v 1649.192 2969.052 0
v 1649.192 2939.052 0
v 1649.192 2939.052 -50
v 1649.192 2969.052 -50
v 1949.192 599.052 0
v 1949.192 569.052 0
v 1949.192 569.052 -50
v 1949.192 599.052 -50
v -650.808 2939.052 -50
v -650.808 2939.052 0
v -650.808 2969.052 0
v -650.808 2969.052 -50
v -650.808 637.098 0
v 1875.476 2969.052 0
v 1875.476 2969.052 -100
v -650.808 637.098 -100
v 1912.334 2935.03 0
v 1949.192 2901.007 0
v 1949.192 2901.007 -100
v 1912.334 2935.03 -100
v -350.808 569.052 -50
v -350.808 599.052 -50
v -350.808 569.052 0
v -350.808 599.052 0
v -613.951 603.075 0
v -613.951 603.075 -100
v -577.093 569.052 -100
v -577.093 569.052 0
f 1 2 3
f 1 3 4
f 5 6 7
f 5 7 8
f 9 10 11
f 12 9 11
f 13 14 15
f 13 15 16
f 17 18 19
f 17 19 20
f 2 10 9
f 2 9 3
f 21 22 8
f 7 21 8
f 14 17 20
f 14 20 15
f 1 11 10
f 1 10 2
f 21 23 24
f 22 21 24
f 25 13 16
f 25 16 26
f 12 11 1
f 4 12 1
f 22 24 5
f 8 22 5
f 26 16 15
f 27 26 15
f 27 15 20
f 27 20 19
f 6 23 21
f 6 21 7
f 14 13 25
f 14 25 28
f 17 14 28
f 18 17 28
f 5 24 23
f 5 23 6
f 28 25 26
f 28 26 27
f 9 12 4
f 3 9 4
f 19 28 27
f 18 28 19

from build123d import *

# Parameters (mm, degrees)
F1_DEPTH = 100
F2_W     = 2300
F2_H     = 30
F3_DEPTH = 50
F4_DEPTH = 50


with BuildPart() as f1:
    # F0 (on Top) → F1 (new body)
    with BuildSketch(Plane.XY):
        Polygon((1912.333639, 2935.029772), (1875.475709, 2969.052476), (-650.808432, 637.097883), (-613.950503, 603.075179), align=None)
        Polygon((1949.191568, 2901.007068), (1912.333639, 2935.029772), (-613.950503, 603.075179), (-577.092574, 569.052476), align=None)
    extrude(amount=-F1_DEPTH)


with BuildPart() as f3:
    # F2 (on Top) → F3 (new body)
    with BuildSketch(Plane.XY):
        with Locations((499.191568, 2954.052476)):
            Rectangle(F2_W, F2_H)
    extrude(amount=-F3_DEPTH)


with BuildPart() as f4:
    # F2 (on Top) → F4 (new body)
    with BuildSketch(Plane.XY):
        with Locations((799.191568, 584.052476)):
            Rectangle(F2_W, F2_H)
    extrude(amount=-F4_DEPTH)


solid = Compound([f1.part, f3.part, f4.part])
